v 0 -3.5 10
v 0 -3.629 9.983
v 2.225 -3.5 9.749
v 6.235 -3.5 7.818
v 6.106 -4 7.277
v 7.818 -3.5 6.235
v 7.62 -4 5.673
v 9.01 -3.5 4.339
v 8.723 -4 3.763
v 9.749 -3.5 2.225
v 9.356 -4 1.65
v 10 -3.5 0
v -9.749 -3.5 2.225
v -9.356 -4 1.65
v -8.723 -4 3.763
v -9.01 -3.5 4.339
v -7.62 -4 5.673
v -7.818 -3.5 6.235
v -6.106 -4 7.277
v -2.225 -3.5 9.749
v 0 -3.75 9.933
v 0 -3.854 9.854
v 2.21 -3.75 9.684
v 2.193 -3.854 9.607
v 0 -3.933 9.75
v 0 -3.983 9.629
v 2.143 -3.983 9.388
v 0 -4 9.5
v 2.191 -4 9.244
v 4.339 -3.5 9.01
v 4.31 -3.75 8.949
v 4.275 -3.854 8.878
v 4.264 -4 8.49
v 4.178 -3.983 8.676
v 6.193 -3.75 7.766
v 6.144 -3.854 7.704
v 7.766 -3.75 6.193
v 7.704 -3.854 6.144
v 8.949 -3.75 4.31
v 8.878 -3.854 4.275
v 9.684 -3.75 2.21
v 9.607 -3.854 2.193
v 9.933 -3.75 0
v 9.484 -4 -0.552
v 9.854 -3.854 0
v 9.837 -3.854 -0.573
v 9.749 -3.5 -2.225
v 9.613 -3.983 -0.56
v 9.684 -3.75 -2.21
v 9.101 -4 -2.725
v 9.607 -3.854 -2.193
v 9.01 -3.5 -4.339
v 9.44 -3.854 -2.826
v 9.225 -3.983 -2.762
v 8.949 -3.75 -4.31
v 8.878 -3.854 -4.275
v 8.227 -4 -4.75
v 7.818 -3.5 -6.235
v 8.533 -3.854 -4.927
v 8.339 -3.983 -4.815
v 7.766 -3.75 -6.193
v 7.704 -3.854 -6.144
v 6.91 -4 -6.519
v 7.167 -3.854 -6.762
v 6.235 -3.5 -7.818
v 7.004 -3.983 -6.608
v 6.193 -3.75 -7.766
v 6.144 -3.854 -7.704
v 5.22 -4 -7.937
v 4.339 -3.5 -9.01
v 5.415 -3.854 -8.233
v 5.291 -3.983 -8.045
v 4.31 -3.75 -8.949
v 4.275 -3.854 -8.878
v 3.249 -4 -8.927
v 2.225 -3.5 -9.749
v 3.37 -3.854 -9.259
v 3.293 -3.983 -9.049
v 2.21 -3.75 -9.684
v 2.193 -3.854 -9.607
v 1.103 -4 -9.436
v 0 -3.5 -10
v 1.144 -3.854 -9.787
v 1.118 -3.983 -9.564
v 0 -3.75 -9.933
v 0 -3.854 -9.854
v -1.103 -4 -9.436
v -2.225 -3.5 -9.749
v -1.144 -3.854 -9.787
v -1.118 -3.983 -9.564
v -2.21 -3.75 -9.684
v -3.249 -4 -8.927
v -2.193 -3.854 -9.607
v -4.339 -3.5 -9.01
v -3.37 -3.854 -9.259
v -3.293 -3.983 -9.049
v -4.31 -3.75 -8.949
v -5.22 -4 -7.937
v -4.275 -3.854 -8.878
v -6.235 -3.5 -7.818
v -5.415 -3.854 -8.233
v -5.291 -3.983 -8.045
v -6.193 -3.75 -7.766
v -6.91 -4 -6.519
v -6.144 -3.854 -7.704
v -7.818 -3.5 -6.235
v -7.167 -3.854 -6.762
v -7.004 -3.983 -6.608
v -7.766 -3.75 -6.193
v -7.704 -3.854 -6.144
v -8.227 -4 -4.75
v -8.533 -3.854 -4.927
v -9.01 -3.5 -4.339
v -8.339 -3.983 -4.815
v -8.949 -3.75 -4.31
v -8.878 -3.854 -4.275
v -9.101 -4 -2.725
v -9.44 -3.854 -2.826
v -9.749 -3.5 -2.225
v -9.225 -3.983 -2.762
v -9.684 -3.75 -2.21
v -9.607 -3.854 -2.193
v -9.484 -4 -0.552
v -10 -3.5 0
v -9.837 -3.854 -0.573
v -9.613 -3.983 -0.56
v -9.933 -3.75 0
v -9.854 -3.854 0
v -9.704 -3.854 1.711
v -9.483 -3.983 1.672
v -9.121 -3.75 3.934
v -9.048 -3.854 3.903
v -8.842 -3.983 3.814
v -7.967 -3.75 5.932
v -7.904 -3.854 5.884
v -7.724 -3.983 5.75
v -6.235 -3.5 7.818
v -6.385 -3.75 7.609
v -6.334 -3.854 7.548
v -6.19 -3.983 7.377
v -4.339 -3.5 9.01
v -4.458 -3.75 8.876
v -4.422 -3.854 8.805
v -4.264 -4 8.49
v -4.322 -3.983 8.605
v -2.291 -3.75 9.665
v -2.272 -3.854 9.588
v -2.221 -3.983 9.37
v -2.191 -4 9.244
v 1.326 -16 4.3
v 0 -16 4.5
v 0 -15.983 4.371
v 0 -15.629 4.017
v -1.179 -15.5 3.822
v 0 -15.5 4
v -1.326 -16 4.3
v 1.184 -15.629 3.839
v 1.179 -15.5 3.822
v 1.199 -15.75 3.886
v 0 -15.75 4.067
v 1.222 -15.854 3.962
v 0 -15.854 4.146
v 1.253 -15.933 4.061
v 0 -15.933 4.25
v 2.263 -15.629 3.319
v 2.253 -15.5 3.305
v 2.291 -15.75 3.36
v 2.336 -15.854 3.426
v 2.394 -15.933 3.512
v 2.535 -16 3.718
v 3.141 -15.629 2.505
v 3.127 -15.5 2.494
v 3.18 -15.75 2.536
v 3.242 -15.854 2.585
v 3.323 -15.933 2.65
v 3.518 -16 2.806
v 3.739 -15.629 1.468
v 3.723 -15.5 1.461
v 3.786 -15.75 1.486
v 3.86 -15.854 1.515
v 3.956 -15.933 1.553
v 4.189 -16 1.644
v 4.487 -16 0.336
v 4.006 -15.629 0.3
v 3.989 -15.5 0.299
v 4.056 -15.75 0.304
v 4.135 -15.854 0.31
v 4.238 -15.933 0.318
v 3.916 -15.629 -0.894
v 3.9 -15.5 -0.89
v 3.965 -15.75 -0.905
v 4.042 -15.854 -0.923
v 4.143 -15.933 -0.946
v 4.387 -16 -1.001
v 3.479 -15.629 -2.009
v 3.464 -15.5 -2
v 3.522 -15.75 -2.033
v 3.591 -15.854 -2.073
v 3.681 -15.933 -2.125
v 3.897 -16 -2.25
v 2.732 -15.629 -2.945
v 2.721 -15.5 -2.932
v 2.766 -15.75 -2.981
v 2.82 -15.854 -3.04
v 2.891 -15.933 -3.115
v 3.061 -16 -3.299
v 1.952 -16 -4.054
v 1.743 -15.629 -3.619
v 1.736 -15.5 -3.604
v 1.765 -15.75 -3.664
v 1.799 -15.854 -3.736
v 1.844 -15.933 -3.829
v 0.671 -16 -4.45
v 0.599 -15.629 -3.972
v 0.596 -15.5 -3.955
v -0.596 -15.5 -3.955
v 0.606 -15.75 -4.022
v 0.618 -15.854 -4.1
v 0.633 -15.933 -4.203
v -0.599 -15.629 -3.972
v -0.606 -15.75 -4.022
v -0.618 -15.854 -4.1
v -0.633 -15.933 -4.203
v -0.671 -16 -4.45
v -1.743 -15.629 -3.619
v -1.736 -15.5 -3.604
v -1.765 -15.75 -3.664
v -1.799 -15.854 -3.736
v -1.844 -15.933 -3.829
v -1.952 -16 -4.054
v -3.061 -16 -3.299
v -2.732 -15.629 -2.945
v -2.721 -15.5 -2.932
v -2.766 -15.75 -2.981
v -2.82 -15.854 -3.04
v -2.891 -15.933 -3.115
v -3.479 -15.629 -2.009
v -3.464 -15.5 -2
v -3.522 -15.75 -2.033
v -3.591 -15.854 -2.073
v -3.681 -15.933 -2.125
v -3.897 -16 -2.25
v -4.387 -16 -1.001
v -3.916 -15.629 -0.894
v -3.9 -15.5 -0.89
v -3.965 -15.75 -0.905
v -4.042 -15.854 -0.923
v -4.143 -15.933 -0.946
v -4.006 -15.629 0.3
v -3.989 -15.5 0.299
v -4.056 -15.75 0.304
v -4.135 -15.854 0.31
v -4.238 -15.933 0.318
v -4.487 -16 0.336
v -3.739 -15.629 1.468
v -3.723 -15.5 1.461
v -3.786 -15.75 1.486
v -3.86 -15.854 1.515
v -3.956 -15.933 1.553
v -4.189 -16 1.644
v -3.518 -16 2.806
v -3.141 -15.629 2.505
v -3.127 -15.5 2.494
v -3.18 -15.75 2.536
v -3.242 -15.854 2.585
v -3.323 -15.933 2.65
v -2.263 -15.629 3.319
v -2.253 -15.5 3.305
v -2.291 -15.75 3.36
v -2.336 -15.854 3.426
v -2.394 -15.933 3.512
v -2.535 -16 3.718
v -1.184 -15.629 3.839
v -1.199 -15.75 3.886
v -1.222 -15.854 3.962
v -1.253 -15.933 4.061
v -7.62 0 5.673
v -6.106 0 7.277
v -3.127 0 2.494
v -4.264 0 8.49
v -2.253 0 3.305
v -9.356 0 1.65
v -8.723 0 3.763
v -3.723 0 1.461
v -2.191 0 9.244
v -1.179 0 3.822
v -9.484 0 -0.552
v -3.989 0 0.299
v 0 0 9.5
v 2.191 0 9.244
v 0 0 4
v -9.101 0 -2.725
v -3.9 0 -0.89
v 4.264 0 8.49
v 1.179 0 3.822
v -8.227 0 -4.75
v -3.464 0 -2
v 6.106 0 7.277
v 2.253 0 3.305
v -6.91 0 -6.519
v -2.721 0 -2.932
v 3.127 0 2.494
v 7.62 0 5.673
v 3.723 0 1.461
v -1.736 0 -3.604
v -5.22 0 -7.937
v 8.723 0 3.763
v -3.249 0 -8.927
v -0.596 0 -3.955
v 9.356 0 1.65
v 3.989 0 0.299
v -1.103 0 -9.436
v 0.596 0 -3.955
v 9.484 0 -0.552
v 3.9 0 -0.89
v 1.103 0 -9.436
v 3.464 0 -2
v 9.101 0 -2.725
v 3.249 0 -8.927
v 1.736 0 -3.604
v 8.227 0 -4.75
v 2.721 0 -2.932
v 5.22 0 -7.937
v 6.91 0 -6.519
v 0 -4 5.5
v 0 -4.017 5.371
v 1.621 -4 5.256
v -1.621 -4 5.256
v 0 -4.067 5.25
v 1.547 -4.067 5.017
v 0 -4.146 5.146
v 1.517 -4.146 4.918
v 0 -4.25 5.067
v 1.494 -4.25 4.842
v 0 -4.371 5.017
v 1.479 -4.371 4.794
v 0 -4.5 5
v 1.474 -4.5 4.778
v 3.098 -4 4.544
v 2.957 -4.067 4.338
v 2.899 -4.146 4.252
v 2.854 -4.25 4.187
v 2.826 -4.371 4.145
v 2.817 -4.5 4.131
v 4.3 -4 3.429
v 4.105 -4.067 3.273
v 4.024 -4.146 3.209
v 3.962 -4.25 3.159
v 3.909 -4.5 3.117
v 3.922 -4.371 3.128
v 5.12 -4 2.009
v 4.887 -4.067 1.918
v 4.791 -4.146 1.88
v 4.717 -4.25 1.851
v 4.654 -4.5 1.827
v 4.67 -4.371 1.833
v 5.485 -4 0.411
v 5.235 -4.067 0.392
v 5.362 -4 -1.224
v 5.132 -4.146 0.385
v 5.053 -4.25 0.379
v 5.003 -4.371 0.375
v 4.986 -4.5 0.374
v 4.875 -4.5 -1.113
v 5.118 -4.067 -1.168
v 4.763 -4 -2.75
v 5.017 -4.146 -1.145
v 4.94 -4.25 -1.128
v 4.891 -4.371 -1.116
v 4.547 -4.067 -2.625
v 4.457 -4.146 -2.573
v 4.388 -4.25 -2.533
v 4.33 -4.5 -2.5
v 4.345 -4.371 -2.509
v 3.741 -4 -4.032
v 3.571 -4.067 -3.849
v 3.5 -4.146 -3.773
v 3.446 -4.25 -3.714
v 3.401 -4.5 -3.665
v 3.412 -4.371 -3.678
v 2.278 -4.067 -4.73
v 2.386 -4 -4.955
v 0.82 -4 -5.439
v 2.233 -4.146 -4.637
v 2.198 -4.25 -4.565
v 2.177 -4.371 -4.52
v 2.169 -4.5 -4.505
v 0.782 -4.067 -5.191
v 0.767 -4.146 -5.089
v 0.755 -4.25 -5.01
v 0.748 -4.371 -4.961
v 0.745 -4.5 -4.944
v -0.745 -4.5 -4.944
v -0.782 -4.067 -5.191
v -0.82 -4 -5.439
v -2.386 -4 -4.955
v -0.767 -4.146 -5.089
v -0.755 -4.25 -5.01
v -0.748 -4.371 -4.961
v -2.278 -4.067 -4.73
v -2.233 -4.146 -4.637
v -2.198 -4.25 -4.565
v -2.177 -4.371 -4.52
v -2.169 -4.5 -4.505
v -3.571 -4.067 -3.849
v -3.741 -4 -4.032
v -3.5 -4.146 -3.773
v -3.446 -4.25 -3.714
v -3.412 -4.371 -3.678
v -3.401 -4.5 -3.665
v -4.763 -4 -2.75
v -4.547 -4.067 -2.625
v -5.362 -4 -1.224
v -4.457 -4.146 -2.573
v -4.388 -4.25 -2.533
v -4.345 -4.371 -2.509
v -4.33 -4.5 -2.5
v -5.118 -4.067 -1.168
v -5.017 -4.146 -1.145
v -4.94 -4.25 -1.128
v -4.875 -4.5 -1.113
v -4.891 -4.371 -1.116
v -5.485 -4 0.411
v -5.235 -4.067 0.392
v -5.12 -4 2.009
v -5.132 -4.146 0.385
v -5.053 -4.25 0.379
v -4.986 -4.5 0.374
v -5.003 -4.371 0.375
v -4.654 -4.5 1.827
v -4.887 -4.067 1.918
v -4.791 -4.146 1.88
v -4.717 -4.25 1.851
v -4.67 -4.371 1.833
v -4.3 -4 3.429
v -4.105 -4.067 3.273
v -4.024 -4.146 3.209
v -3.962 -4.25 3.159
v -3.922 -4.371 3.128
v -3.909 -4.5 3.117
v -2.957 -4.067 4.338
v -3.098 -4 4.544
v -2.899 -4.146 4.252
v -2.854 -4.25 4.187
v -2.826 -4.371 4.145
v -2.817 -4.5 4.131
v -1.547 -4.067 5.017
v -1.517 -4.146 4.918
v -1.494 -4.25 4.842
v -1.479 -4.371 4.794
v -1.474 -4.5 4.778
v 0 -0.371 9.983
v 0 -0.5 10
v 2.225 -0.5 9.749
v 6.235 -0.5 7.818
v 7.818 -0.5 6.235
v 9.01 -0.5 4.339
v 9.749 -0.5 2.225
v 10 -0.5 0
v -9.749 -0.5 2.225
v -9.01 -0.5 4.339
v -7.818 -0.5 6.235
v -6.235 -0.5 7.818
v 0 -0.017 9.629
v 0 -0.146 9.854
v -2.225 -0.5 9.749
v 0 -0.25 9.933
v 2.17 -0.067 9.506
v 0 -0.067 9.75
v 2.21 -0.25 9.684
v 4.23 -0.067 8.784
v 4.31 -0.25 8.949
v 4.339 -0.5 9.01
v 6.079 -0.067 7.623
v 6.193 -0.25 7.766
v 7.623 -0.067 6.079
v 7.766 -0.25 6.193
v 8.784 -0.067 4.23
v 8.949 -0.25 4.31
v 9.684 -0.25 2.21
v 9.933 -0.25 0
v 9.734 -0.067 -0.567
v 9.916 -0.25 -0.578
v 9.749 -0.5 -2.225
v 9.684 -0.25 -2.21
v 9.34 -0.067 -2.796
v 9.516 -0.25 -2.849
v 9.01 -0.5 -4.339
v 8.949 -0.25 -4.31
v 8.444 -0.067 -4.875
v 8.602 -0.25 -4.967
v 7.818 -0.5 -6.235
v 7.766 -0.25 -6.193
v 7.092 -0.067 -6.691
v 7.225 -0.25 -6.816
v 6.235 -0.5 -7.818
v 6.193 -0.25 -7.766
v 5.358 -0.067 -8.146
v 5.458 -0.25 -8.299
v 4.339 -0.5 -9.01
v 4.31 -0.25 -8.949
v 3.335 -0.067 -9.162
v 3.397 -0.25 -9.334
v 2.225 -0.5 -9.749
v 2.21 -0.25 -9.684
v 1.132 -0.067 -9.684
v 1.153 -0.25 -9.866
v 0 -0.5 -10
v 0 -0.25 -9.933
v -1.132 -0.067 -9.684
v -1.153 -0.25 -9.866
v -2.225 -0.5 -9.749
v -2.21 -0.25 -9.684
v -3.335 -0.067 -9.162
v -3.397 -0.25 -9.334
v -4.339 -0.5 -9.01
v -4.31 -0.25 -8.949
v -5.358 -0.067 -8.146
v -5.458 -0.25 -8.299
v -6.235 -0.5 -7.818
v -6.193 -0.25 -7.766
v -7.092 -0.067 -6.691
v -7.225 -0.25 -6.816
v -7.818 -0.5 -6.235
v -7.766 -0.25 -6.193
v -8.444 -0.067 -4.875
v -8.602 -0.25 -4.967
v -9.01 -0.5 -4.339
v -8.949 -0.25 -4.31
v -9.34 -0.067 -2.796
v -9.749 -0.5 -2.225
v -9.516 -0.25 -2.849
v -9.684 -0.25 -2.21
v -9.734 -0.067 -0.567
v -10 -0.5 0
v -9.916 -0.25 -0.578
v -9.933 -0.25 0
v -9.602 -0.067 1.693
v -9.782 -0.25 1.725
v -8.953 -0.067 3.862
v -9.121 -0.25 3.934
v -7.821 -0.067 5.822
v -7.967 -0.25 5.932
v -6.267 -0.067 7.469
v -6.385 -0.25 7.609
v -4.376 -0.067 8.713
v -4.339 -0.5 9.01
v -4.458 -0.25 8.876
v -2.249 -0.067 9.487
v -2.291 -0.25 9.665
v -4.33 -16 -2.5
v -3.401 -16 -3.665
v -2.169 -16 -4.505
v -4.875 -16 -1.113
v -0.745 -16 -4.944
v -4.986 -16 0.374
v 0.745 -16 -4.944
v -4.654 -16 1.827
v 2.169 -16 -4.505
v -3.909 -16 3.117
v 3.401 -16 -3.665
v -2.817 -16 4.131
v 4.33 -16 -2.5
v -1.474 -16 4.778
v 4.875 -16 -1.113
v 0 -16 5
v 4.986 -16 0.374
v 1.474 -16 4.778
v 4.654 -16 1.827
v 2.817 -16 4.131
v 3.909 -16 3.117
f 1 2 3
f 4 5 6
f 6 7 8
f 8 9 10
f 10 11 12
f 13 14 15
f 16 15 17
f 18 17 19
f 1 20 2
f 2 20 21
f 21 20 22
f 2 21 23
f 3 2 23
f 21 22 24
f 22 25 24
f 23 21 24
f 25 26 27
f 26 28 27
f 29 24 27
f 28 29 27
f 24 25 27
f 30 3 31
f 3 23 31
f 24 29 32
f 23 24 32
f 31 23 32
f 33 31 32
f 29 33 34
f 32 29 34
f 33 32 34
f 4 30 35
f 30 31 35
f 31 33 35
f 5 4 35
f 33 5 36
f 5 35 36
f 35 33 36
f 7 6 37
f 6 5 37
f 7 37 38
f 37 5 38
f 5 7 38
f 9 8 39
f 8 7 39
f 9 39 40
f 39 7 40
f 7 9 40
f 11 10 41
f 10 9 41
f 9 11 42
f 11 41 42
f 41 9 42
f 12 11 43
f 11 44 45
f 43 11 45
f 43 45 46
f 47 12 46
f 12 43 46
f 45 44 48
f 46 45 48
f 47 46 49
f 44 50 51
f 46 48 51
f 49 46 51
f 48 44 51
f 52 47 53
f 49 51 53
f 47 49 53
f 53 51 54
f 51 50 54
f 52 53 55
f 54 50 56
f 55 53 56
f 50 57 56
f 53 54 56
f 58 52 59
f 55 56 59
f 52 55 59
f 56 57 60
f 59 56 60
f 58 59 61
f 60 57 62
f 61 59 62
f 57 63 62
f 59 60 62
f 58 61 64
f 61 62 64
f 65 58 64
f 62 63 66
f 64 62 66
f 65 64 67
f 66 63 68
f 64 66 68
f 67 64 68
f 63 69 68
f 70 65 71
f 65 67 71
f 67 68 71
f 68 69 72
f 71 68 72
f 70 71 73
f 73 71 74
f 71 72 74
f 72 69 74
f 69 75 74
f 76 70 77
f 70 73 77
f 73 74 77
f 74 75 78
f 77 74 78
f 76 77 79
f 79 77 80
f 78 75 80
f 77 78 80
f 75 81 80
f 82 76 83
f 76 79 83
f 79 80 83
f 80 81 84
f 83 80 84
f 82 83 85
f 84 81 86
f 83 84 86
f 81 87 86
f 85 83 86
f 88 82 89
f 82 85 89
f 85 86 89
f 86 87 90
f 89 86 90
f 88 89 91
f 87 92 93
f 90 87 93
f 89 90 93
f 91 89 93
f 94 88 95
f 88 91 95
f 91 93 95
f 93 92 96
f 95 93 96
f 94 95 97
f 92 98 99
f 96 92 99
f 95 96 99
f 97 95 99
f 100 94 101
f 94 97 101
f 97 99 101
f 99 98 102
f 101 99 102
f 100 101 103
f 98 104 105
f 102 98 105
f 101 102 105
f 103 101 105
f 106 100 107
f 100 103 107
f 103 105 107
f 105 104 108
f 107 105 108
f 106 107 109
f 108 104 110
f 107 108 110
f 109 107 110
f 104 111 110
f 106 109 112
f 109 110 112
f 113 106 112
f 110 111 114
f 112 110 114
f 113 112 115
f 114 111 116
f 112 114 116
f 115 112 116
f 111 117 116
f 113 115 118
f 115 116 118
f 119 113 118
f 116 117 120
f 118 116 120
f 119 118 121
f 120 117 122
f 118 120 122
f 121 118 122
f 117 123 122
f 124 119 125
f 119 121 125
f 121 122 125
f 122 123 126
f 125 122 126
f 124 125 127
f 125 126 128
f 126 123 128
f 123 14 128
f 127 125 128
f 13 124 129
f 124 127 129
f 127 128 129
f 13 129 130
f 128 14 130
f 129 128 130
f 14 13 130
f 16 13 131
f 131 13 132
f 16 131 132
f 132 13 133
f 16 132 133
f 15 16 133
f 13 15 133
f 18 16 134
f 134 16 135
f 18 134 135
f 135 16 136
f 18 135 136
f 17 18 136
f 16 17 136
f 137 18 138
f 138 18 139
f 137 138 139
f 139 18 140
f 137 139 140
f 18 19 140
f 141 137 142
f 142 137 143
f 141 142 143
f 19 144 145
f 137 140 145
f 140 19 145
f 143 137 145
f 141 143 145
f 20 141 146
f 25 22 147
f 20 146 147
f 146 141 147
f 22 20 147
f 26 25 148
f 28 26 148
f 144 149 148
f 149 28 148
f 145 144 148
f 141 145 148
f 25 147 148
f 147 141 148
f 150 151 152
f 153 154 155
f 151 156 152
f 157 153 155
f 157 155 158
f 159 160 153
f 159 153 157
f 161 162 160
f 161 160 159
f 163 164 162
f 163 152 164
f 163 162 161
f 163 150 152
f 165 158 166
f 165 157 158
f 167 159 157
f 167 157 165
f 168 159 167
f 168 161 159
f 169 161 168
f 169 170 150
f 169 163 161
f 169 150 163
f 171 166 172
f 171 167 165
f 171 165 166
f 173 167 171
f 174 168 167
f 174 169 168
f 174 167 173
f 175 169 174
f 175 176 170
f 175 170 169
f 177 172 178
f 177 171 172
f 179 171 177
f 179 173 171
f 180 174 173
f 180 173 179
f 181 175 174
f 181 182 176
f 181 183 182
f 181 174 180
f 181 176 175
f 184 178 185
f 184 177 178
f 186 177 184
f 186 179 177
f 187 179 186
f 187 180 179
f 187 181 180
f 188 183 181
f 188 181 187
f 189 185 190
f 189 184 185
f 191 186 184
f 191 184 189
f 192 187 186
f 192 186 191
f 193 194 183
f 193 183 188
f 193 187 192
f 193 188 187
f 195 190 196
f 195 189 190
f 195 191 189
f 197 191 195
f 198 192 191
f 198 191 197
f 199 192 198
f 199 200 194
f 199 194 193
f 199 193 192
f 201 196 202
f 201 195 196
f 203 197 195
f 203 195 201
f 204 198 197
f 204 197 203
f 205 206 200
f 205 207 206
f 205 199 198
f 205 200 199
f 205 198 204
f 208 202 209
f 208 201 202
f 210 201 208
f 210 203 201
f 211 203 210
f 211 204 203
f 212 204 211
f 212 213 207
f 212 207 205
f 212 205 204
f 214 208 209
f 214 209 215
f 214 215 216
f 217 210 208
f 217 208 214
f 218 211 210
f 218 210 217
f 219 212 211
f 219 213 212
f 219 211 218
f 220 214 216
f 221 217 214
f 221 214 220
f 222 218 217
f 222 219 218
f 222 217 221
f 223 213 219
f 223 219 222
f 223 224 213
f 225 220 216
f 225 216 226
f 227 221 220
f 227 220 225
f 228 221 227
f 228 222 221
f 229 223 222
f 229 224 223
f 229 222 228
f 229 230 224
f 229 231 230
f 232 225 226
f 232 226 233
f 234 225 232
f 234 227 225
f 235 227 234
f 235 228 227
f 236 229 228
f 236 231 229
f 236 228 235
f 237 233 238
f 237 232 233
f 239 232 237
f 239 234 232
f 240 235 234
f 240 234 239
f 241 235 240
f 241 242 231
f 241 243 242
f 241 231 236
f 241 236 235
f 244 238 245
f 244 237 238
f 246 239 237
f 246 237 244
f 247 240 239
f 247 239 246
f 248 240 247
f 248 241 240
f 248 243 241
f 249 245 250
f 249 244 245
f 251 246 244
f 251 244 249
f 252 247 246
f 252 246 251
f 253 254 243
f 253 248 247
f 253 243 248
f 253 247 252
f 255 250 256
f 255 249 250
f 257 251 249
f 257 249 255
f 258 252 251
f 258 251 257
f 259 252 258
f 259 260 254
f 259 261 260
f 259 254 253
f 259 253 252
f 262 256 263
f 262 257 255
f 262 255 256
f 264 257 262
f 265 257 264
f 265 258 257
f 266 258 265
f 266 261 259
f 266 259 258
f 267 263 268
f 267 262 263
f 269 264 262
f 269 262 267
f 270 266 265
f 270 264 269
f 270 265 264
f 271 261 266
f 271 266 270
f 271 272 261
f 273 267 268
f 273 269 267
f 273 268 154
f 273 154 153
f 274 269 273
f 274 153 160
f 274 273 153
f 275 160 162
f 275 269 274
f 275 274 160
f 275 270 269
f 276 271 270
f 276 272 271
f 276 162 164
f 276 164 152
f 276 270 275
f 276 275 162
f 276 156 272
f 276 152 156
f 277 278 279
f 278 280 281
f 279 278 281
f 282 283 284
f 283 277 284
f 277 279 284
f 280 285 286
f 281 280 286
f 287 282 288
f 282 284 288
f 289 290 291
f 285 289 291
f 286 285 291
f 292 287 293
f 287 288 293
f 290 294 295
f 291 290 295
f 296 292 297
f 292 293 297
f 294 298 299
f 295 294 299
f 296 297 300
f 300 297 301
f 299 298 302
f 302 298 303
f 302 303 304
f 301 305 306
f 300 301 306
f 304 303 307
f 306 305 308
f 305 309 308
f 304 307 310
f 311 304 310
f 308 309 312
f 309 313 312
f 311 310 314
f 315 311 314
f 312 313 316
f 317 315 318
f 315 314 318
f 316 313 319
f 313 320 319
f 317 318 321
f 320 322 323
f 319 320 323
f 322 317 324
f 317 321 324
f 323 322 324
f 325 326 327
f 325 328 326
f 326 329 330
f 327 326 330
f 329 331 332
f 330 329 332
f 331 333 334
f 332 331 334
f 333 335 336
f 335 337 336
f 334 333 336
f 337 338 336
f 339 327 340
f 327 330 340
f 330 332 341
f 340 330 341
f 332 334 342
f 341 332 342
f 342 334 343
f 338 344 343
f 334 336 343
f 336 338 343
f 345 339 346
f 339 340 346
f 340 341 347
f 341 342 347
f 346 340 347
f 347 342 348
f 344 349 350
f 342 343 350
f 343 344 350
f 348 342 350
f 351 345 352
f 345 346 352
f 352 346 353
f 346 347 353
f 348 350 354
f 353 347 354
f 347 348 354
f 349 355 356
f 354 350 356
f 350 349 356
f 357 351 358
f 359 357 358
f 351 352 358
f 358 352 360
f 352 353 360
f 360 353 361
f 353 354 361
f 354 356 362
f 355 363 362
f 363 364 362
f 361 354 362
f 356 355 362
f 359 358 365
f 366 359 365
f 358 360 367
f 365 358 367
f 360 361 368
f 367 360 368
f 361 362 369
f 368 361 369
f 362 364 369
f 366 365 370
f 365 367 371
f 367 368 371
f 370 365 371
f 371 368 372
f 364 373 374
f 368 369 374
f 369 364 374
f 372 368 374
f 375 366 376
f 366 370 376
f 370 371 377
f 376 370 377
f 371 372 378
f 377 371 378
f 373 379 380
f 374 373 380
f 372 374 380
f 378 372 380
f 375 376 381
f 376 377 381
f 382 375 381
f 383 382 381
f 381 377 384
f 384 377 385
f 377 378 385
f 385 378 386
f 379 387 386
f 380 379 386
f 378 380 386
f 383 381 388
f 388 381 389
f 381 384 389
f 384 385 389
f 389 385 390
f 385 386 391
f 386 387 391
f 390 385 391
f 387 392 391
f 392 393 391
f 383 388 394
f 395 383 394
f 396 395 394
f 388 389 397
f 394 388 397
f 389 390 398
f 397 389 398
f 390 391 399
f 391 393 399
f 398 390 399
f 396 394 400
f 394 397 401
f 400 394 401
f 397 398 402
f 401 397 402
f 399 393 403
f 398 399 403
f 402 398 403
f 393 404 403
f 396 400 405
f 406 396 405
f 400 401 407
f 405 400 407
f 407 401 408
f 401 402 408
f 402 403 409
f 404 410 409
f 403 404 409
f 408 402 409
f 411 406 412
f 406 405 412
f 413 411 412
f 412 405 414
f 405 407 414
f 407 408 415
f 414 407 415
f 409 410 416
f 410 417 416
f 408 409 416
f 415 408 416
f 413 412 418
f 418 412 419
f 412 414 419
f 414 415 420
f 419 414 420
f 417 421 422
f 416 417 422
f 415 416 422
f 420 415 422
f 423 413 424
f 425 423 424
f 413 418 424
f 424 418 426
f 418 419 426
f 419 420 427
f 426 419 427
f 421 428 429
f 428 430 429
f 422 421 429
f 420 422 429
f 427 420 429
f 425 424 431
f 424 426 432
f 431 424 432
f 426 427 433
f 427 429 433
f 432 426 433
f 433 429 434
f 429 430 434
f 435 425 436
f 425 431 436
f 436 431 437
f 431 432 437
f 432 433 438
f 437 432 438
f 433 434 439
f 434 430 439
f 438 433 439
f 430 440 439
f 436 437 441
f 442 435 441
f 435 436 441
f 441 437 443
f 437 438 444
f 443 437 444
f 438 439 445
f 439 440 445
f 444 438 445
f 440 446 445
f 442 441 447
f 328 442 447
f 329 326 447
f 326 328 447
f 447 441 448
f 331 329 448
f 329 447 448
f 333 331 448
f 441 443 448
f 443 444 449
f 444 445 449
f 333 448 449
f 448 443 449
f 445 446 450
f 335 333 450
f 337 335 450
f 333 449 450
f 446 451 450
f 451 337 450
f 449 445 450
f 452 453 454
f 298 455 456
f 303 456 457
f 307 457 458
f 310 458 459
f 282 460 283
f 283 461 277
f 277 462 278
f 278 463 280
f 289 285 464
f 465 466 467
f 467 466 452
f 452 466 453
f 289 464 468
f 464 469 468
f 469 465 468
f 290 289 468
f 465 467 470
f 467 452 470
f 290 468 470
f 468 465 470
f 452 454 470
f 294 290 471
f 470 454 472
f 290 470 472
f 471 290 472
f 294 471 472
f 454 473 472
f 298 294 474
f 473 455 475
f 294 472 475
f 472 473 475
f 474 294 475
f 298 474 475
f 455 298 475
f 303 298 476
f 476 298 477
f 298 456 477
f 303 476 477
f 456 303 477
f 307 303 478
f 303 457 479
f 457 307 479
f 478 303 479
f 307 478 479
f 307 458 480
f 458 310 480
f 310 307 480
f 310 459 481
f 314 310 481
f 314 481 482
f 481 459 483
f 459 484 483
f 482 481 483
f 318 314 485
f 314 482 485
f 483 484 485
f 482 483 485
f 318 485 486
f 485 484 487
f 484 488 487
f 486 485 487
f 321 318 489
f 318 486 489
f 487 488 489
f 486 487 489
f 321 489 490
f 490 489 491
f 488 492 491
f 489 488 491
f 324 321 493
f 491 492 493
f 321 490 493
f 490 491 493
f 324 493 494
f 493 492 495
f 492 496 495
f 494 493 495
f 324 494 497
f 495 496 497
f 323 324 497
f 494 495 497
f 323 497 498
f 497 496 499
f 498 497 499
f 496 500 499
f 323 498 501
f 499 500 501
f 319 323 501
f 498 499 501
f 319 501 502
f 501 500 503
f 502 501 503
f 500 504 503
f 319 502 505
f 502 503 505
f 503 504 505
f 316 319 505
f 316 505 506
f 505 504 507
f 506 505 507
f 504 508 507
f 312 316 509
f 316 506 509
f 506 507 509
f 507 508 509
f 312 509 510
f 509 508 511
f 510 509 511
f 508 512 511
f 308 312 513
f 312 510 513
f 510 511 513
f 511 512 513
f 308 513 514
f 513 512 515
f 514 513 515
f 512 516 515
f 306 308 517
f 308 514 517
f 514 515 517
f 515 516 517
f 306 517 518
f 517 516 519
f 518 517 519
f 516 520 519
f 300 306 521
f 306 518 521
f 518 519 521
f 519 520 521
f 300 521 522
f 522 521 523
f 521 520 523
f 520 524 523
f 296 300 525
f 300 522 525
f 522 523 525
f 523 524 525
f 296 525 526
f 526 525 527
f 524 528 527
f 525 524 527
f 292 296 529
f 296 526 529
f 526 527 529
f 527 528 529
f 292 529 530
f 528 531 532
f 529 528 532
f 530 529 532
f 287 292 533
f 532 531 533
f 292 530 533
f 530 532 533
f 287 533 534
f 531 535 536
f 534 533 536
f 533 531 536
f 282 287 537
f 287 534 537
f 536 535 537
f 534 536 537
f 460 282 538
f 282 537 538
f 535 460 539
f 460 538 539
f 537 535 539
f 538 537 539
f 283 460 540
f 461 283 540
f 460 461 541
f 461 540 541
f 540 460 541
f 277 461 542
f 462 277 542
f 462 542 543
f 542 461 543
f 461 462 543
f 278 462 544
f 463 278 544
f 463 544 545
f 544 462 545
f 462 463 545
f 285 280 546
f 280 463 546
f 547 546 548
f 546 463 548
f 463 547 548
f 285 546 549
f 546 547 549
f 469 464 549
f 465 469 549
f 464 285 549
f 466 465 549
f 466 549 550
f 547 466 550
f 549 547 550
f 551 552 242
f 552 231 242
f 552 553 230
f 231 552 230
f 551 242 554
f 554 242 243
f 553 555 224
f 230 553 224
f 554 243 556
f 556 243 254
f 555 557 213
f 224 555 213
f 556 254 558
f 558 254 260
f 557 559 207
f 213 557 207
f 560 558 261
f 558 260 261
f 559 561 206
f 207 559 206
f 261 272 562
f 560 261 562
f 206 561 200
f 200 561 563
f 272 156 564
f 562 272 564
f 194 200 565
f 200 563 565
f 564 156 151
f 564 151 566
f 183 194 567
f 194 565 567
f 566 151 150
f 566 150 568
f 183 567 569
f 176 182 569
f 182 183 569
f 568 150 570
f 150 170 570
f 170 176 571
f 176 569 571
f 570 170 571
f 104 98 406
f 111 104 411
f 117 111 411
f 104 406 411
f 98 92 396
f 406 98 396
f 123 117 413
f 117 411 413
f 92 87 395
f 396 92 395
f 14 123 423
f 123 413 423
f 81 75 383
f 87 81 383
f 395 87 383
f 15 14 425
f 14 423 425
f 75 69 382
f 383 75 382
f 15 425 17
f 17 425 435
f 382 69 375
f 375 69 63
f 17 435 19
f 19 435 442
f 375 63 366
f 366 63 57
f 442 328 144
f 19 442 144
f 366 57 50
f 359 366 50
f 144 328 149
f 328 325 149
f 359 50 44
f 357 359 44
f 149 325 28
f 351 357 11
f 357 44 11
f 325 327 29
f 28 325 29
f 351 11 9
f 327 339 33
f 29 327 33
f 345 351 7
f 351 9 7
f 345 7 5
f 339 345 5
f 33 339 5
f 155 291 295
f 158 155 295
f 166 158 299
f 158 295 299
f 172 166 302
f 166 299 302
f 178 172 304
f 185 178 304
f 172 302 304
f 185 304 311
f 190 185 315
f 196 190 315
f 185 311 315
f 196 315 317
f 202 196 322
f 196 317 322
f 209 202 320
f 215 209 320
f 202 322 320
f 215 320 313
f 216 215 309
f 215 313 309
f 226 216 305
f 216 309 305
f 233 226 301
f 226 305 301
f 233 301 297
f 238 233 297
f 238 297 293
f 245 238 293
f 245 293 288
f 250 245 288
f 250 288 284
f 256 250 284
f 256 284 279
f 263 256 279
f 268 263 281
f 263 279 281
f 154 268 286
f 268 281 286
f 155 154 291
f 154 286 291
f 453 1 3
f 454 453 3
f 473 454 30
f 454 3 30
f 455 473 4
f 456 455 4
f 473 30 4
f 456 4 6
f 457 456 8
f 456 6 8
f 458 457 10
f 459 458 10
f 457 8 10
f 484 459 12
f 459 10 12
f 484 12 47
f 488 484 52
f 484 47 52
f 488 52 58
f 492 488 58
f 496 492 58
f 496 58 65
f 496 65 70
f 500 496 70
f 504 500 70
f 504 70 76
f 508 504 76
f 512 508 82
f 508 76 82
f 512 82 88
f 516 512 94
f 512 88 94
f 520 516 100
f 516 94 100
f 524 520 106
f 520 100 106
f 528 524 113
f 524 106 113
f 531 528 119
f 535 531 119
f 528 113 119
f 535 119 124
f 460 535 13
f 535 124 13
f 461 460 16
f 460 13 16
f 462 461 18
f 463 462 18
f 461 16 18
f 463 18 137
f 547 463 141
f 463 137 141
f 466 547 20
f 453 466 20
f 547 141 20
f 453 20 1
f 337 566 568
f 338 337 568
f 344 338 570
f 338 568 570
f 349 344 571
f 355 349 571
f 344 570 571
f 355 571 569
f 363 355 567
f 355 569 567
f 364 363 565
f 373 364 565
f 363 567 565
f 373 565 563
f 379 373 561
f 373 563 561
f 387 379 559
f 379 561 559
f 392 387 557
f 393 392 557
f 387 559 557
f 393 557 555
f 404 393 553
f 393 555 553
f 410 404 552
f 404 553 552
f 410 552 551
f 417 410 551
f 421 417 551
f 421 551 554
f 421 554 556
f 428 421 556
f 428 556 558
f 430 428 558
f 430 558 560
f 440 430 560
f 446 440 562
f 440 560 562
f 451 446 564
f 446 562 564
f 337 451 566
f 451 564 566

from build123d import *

# Parameters (mm, degrees)
F2_R = 0.5


with BuildPart() as f1:
    # F0 (on Right) → F1 (revolve)
    with BuildSketch(Plane.YZ):
        Polygon((-16, 4), (0, 4), (0, 10), (-4, 10), (-4, 5), (-16, 5), align=None)
    revolve(axis=Axis((0, 0, 0), (0, 1, 0)))

    # F2
    f2_edges = [f1.edges().sort_by_distance(p)[0] for p in [
        (0, -16, -4),
        (0, -4, -5),
        (0, -4, -10),
        (0, 0, -10),
    ]]
    fillet(f2_edges, radius=F2_R)


solid = f1.part
